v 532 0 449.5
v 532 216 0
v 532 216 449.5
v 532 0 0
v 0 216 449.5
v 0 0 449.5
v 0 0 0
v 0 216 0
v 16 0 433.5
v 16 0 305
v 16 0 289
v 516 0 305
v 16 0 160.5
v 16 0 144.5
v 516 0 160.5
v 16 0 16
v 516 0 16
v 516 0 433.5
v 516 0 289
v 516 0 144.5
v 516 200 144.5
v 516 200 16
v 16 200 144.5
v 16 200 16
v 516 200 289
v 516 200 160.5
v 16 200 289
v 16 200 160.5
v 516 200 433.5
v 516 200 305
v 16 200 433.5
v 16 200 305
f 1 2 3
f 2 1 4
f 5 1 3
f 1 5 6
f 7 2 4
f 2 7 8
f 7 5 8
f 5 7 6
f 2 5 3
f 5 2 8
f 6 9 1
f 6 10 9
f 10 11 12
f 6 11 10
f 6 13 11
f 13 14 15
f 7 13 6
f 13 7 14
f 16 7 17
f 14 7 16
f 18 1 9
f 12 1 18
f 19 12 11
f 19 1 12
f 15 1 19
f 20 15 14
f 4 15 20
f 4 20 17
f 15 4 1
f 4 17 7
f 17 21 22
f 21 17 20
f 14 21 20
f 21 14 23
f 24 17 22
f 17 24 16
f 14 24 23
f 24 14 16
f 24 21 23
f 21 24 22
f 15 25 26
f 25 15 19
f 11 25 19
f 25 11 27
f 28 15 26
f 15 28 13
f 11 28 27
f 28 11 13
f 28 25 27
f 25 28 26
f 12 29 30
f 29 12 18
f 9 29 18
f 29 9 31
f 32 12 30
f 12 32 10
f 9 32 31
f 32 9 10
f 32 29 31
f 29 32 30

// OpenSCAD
//inner width
iw = 500;

//strength of wood
s = 16;

num_rows = 3;
num_floors = num_rows+1;

module_h = 128.5;


oh = s + num_rows*(s + module_h);

ow = iw + 2*s;
d = 200;

difference() {
cube([ow,d+s,oh]);
translate([s,0,s]) cube([iw,d,module_h]);
translate([s,0,module_h+2*s]) cube([iw,d,module_h]);
translate([s,0,2*module_h+3*s]) cube([iw,d,module_h]);




}


echo("TOTAL: height",oh, "depth", d, "width", ow);

echo("##################");

echo("(2x) sides: ",oh,"x",d);
echo("(",num_floors,"x) floors: ",iw,"x",d);
echo("backplate: ",ow,"x",oh);
echo("(2x) module_covers: ",iw,"x",module_h);


echo("##################");
